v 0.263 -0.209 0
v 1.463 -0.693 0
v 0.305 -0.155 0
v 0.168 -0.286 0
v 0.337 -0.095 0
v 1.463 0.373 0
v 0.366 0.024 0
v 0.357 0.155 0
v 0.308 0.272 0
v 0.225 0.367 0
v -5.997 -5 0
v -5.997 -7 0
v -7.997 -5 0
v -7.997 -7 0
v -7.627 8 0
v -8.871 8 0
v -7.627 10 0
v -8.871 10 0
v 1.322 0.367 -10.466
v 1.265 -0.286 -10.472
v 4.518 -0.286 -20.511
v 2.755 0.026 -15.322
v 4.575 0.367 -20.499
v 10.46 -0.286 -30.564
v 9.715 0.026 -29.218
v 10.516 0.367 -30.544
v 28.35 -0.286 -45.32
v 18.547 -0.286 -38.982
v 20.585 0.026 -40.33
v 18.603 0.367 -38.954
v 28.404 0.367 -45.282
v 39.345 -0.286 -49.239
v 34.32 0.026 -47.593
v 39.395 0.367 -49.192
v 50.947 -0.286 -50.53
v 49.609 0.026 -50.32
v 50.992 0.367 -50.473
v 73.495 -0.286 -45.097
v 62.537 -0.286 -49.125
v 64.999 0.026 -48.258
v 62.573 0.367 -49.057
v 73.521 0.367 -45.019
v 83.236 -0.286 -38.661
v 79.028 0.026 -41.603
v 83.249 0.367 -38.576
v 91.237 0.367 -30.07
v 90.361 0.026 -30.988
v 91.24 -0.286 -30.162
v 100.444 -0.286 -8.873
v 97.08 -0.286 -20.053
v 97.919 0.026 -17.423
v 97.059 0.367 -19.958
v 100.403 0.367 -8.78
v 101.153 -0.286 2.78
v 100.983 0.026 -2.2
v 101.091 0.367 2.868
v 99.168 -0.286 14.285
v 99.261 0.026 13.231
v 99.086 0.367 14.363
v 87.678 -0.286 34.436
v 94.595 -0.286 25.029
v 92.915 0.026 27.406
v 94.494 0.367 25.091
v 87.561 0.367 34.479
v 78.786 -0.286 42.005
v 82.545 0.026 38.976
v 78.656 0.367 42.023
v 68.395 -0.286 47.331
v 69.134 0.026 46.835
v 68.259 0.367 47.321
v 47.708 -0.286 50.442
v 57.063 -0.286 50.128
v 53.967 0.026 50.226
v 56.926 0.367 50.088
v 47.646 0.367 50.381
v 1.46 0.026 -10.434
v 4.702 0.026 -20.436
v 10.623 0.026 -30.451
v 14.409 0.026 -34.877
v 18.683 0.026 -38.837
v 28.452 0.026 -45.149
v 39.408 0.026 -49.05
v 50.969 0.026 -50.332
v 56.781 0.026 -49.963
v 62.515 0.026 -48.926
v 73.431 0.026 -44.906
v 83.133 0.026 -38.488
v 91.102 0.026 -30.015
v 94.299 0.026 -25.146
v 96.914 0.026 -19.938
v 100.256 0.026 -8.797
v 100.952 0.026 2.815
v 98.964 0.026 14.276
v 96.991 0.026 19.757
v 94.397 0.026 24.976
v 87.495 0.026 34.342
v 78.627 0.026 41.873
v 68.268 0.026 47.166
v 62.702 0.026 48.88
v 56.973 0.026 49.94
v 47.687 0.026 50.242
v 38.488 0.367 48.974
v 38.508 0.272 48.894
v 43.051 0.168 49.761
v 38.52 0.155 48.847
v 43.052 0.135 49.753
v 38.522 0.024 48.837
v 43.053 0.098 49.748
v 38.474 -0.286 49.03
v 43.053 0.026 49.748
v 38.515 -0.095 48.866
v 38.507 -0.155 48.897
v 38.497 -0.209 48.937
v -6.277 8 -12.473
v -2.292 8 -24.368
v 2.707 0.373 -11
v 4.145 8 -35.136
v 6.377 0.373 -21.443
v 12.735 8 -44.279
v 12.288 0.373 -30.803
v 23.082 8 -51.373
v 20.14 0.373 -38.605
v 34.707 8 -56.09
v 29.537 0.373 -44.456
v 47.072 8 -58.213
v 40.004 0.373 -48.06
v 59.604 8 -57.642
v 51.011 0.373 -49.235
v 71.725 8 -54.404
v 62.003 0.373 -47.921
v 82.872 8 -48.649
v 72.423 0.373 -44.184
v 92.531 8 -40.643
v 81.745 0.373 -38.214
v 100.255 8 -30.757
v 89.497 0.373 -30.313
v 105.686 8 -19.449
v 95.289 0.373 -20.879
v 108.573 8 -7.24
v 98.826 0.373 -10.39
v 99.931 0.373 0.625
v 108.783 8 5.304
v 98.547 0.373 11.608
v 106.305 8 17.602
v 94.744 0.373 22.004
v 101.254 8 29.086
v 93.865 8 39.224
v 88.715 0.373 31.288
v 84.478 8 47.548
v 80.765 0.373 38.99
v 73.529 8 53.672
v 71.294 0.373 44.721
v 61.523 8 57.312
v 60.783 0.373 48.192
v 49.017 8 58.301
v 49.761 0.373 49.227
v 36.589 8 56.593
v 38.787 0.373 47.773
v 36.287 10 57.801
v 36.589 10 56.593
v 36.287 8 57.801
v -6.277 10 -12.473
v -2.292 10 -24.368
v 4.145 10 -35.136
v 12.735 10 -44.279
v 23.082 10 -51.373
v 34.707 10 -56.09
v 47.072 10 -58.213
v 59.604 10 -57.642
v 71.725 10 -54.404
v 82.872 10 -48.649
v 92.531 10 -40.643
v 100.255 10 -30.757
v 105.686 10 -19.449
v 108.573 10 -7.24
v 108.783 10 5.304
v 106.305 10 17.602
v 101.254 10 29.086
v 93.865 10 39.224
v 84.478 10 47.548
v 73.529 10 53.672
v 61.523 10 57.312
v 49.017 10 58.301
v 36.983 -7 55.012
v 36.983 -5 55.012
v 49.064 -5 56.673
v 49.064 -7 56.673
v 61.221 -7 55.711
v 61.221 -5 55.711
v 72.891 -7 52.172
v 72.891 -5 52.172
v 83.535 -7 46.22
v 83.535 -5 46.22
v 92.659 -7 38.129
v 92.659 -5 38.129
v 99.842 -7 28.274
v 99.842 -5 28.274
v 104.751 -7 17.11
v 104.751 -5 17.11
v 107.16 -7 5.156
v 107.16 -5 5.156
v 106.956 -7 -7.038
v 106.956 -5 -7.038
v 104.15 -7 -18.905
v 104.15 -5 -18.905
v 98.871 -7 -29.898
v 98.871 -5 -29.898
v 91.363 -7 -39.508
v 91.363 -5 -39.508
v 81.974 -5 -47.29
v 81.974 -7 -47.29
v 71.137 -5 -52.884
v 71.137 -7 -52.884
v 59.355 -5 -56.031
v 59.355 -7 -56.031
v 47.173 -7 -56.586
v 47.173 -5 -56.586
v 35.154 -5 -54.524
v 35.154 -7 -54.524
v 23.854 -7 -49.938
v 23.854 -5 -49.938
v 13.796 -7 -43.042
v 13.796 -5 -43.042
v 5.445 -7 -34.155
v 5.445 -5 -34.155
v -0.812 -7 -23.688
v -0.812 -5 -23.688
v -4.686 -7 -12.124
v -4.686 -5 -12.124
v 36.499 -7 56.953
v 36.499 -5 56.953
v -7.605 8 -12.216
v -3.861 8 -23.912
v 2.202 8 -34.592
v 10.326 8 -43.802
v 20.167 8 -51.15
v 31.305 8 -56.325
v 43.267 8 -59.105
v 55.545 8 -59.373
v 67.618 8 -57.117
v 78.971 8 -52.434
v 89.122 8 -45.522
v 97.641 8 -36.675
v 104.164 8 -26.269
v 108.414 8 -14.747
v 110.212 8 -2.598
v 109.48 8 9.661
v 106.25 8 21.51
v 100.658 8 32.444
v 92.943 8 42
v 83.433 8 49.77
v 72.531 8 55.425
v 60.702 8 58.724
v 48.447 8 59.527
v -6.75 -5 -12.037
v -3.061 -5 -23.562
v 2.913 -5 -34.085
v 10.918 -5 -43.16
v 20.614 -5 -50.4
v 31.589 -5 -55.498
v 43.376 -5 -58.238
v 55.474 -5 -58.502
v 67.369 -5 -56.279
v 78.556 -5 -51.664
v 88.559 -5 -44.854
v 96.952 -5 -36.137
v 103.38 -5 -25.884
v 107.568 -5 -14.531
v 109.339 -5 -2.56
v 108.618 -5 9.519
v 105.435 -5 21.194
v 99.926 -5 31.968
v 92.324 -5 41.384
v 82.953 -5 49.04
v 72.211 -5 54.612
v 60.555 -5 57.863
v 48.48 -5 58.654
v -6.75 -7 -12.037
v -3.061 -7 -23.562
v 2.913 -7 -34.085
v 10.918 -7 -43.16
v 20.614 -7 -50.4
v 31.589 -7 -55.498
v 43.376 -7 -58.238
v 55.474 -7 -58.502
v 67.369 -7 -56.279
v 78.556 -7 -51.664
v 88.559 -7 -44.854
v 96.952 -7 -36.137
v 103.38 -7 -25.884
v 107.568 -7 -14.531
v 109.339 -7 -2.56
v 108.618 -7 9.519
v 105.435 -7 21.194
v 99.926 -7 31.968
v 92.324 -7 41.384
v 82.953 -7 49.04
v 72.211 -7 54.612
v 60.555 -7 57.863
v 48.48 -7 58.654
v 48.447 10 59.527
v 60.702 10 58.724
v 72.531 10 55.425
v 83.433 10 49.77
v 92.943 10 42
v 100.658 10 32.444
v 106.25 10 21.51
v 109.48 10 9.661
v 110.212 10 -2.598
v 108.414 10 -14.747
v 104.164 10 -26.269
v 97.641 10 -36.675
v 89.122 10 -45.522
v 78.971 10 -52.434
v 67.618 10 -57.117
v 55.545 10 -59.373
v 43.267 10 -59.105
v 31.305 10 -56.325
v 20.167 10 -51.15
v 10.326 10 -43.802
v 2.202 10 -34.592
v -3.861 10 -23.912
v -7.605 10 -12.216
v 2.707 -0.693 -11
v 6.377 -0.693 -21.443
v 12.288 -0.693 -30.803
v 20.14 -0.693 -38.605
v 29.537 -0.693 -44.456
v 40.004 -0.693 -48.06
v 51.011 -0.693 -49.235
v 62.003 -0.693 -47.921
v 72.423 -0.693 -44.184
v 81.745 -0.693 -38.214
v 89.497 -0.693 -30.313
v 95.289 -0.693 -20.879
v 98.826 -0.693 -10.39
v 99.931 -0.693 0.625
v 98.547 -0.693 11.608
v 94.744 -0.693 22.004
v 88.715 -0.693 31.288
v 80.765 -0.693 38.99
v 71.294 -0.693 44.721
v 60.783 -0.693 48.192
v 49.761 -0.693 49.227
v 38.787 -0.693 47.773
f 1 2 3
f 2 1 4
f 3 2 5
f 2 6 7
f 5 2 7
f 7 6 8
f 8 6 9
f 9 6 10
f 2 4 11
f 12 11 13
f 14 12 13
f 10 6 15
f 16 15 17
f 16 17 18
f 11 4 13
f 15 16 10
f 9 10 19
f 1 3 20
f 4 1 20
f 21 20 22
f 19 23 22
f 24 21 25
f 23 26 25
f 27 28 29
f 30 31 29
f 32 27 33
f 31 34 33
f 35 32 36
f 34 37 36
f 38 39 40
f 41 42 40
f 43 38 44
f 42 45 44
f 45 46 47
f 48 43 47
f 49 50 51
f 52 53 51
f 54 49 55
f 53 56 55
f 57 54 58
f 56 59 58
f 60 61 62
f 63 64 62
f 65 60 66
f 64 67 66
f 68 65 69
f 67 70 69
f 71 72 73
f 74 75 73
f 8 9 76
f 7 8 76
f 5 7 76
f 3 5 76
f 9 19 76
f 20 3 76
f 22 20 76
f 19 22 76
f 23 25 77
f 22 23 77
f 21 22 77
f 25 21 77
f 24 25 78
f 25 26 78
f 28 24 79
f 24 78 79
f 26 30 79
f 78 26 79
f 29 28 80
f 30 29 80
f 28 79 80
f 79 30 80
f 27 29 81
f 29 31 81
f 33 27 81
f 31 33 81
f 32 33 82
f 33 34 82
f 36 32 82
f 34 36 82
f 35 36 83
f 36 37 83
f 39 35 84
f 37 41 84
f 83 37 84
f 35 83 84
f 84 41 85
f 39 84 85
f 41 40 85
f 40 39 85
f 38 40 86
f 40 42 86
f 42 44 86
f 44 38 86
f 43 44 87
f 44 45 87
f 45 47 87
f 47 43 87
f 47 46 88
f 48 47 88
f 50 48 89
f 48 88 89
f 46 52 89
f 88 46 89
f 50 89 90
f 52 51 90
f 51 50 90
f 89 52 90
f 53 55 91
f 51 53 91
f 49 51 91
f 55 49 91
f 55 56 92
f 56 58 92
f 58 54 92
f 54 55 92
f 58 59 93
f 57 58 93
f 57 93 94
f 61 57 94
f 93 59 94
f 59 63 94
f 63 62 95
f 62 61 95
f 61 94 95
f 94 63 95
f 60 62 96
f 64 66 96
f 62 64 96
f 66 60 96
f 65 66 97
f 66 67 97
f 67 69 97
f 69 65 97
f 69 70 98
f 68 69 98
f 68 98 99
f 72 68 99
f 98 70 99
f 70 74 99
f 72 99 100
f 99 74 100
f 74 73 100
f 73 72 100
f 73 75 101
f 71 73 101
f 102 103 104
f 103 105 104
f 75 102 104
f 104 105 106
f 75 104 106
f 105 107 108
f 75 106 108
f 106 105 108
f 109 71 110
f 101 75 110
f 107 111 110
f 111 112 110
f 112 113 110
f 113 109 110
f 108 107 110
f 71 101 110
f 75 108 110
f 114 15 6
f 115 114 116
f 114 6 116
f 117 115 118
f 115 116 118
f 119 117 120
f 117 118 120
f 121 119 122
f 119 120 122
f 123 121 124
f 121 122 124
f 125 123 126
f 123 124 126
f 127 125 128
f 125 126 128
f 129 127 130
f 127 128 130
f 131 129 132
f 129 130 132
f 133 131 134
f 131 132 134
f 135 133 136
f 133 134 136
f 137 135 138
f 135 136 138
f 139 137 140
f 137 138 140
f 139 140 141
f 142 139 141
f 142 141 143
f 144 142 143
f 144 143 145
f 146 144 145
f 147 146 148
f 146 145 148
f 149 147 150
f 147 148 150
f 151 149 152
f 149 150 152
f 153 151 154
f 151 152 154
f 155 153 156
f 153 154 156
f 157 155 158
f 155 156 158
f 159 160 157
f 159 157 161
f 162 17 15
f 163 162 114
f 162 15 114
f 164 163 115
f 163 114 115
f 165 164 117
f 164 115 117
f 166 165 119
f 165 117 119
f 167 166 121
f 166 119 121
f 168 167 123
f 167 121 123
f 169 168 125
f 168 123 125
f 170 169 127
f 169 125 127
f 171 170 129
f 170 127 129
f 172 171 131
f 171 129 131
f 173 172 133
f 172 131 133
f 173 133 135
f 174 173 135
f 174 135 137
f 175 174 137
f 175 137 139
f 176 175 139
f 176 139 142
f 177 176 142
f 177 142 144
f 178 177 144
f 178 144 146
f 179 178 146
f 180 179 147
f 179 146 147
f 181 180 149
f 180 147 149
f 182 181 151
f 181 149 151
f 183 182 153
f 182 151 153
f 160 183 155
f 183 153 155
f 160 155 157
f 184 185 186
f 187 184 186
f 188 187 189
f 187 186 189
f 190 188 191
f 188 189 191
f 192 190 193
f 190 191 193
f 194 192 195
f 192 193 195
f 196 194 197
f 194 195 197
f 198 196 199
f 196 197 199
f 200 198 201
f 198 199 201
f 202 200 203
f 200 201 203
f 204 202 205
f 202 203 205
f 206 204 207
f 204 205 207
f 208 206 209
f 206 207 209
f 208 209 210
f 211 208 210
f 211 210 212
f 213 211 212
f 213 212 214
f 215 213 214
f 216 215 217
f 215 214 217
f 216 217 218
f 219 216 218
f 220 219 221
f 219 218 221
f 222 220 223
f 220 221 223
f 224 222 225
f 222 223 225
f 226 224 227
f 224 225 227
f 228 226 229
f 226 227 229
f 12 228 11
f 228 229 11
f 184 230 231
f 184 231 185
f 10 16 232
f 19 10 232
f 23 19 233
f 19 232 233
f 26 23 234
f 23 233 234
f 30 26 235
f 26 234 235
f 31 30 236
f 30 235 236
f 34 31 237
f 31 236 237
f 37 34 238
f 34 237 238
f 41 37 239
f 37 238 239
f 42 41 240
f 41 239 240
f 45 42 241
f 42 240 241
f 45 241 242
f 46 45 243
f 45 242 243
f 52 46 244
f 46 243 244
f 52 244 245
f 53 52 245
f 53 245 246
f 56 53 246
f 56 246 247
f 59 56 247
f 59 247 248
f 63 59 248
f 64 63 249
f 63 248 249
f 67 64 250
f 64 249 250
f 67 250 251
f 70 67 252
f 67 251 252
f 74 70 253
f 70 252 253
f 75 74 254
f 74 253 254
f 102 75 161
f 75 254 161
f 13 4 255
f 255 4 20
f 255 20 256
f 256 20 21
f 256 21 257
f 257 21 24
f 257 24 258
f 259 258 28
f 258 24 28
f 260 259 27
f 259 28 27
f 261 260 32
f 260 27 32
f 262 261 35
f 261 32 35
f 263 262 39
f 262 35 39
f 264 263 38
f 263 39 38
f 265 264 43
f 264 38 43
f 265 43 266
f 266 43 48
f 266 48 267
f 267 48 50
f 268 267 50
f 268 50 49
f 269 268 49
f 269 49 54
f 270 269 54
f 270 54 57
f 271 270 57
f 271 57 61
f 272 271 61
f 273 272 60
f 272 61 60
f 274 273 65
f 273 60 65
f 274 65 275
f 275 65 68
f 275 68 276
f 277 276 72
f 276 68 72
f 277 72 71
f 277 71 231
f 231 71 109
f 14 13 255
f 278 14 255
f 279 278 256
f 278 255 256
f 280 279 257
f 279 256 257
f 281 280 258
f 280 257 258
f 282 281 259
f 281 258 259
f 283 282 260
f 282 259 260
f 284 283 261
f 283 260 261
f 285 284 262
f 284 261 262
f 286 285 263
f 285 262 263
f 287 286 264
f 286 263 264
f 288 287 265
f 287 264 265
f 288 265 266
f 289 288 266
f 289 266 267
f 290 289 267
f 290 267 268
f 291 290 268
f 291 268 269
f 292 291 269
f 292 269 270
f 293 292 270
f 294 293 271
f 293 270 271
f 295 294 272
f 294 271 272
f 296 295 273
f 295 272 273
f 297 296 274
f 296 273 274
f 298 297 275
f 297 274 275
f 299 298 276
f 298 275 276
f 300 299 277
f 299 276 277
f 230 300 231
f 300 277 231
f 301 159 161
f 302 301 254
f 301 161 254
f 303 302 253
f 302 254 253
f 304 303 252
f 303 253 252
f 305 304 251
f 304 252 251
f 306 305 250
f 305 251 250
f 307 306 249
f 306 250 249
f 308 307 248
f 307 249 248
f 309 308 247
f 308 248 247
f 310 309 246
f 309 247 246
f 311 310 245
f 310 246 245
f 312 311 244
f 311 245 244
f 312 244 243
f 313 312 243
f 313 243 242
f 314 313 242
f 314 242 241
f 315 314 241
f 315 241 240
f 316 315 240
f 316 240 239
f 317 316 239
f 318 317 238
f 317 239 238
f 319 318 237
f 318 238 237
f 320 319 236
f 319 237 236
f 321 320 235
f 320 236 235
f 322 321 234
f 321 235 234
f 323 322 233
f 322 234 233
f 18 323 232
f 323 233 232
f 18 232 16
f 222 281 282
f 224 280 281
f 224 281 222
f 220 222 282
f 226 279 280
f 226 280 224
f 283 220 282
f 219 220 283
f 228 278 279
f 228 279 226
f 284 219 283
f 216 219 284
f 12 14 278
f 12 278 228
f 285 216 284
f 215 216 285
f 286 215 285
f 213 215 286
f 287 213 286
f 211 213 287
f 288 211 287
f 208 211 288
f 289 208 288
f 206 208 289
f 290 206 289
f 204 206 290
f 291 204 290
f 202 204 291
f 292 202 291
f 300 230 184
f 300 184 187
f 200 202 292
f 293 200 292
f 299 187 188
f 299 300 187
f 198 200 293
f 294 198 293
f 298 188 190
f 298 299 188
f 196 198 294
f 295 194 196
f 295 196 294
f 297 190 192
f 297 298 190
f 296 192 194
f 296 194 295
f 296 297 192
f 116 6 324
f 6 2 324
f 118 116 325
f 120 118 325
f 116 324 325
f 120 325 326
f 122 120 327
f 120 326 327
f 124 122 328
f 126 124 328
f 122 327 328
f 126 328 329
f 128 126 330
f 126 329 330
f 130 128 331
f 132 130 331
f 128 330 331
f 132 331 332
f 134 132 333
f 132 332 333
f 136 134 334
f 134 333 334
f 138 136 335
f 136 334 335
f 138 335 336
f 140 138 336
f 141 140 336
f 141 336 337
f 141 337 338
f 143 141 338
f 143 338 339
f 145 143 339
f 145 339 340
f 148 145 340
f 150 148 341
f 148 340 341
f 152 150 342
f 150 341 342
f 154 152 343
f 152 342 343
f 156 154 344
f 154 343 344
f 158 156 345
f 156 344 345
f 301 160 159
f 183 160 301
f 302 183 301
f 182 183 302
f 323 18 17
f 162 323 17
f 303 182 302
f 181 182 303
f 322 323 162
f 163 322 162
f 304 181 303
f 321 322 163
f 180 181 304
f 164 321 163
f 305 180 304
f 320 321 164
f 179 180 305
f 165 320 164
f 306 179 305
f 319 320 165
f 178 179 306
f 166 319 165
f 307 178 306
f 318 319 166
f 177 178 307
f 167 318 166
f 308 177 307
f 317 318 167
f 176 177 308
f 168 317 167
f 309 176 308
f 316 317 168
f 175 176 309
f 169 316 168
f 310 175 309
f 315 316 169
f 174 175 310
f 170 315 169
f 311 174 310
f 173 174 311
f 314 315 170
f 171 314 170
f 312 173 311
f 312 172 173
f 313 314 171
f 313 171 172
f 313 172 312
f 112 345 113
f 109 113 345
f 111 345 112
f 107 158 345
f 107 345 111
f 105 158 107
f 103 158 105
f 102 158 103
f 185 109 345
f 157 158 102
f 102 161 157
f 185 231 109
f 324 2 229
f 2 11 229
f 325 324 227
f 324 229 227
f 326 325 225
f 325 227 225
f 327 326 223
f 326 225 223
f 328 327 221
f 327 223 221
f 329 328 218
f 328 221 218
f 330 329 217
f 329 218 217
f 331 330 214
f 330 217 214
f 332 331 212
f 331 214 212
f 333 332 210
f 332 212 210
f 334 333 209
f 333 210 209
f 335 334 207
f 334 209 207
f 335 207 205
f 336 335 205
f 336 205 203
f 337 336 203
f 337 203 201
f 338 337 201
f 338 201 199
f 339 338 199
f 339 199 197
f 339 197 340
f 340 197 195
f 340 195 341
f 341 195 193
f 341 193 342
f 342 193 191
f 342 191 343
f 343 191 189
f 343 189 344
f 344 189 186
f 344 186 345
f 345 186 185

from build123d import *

# Parameters (mm, degrees)
REVOLVE1_ANGLE      = 284
FILLET2_R           = 0.4
BOSS_EXTRUDE1_DEPTH = 2
BOSS_EXTRUDE2_DEPTH = 2


with BuildPart() as part:
    # Sketch1 → Revolve1 (revolve)
    with BuildSketch(Plane.XY):
        Polygon((0.662781953, 0), (-8.871246788, 8), (-7.626667727, 8), (1.462781953, 0.373046127), (1.462781953, -0.692820323), (-5.997472085, -5), (-7.997472085, -5), align=None)
    revolve(axis=Axis((50.698753212, 7.609018033, 0), (0, -1, 0)), revolution_arc=REVOLVE1_ANGLE)

    # Fillet2
    fillet2_edges = [part.edges().sort_by_distance(p)[0] for p in [
        (90.127636631, 0, -30.805219885),
    ]]
    fillet(fillet2_edges, radius=FILLET2_R)

    # Sketch2 → Boss-Extrude1 (add)
    with BuildSketch(Plane(origin=(0, 8, 0), x_dir=(1, 0, 0), z_dir=(0, 1, 0))):
        with BuildLine():
            Line((36.588556817, -56.59290667), (36.287465891, -57.800516414))
            ThreePointArc((36.287465891, -57.800516414), (97.640553804, 36.674954085), (-8.871246788, 0))
            Line((-8.871246788, 0), (-7.626667727, 0))
            ThreePointArc((-7.626667727, 0), (96.65981212, 35.908714704), (36.588556817, -56.59290667))
        make_face()
    extrude(amount=BOSS_EXTRUDE1_DEPTH)

    # Sketch3 → Boss-Extrude2 (add)
    with BuildSketch(Plane.XZ.offset(5)):
        with BuildLine():
            Line((36.498851123, 56.952696554), (36.982694915, 55.012105102))
            ThreePointArc((36.982694915, 55.012105102), (95.375988435, -34.905681712), (-5.997472085, 0))
            Line((-5.997472085, 0), (-7.997472085, 0))
            ThreePointArc((-7.997472085, 0), (96.952009942, -36.137004662), (36.498851123, 56.952696554))
        make_face()
    extrude(amount=BOSS_EXTRUDE2_DEPTH)


solid = part.part
